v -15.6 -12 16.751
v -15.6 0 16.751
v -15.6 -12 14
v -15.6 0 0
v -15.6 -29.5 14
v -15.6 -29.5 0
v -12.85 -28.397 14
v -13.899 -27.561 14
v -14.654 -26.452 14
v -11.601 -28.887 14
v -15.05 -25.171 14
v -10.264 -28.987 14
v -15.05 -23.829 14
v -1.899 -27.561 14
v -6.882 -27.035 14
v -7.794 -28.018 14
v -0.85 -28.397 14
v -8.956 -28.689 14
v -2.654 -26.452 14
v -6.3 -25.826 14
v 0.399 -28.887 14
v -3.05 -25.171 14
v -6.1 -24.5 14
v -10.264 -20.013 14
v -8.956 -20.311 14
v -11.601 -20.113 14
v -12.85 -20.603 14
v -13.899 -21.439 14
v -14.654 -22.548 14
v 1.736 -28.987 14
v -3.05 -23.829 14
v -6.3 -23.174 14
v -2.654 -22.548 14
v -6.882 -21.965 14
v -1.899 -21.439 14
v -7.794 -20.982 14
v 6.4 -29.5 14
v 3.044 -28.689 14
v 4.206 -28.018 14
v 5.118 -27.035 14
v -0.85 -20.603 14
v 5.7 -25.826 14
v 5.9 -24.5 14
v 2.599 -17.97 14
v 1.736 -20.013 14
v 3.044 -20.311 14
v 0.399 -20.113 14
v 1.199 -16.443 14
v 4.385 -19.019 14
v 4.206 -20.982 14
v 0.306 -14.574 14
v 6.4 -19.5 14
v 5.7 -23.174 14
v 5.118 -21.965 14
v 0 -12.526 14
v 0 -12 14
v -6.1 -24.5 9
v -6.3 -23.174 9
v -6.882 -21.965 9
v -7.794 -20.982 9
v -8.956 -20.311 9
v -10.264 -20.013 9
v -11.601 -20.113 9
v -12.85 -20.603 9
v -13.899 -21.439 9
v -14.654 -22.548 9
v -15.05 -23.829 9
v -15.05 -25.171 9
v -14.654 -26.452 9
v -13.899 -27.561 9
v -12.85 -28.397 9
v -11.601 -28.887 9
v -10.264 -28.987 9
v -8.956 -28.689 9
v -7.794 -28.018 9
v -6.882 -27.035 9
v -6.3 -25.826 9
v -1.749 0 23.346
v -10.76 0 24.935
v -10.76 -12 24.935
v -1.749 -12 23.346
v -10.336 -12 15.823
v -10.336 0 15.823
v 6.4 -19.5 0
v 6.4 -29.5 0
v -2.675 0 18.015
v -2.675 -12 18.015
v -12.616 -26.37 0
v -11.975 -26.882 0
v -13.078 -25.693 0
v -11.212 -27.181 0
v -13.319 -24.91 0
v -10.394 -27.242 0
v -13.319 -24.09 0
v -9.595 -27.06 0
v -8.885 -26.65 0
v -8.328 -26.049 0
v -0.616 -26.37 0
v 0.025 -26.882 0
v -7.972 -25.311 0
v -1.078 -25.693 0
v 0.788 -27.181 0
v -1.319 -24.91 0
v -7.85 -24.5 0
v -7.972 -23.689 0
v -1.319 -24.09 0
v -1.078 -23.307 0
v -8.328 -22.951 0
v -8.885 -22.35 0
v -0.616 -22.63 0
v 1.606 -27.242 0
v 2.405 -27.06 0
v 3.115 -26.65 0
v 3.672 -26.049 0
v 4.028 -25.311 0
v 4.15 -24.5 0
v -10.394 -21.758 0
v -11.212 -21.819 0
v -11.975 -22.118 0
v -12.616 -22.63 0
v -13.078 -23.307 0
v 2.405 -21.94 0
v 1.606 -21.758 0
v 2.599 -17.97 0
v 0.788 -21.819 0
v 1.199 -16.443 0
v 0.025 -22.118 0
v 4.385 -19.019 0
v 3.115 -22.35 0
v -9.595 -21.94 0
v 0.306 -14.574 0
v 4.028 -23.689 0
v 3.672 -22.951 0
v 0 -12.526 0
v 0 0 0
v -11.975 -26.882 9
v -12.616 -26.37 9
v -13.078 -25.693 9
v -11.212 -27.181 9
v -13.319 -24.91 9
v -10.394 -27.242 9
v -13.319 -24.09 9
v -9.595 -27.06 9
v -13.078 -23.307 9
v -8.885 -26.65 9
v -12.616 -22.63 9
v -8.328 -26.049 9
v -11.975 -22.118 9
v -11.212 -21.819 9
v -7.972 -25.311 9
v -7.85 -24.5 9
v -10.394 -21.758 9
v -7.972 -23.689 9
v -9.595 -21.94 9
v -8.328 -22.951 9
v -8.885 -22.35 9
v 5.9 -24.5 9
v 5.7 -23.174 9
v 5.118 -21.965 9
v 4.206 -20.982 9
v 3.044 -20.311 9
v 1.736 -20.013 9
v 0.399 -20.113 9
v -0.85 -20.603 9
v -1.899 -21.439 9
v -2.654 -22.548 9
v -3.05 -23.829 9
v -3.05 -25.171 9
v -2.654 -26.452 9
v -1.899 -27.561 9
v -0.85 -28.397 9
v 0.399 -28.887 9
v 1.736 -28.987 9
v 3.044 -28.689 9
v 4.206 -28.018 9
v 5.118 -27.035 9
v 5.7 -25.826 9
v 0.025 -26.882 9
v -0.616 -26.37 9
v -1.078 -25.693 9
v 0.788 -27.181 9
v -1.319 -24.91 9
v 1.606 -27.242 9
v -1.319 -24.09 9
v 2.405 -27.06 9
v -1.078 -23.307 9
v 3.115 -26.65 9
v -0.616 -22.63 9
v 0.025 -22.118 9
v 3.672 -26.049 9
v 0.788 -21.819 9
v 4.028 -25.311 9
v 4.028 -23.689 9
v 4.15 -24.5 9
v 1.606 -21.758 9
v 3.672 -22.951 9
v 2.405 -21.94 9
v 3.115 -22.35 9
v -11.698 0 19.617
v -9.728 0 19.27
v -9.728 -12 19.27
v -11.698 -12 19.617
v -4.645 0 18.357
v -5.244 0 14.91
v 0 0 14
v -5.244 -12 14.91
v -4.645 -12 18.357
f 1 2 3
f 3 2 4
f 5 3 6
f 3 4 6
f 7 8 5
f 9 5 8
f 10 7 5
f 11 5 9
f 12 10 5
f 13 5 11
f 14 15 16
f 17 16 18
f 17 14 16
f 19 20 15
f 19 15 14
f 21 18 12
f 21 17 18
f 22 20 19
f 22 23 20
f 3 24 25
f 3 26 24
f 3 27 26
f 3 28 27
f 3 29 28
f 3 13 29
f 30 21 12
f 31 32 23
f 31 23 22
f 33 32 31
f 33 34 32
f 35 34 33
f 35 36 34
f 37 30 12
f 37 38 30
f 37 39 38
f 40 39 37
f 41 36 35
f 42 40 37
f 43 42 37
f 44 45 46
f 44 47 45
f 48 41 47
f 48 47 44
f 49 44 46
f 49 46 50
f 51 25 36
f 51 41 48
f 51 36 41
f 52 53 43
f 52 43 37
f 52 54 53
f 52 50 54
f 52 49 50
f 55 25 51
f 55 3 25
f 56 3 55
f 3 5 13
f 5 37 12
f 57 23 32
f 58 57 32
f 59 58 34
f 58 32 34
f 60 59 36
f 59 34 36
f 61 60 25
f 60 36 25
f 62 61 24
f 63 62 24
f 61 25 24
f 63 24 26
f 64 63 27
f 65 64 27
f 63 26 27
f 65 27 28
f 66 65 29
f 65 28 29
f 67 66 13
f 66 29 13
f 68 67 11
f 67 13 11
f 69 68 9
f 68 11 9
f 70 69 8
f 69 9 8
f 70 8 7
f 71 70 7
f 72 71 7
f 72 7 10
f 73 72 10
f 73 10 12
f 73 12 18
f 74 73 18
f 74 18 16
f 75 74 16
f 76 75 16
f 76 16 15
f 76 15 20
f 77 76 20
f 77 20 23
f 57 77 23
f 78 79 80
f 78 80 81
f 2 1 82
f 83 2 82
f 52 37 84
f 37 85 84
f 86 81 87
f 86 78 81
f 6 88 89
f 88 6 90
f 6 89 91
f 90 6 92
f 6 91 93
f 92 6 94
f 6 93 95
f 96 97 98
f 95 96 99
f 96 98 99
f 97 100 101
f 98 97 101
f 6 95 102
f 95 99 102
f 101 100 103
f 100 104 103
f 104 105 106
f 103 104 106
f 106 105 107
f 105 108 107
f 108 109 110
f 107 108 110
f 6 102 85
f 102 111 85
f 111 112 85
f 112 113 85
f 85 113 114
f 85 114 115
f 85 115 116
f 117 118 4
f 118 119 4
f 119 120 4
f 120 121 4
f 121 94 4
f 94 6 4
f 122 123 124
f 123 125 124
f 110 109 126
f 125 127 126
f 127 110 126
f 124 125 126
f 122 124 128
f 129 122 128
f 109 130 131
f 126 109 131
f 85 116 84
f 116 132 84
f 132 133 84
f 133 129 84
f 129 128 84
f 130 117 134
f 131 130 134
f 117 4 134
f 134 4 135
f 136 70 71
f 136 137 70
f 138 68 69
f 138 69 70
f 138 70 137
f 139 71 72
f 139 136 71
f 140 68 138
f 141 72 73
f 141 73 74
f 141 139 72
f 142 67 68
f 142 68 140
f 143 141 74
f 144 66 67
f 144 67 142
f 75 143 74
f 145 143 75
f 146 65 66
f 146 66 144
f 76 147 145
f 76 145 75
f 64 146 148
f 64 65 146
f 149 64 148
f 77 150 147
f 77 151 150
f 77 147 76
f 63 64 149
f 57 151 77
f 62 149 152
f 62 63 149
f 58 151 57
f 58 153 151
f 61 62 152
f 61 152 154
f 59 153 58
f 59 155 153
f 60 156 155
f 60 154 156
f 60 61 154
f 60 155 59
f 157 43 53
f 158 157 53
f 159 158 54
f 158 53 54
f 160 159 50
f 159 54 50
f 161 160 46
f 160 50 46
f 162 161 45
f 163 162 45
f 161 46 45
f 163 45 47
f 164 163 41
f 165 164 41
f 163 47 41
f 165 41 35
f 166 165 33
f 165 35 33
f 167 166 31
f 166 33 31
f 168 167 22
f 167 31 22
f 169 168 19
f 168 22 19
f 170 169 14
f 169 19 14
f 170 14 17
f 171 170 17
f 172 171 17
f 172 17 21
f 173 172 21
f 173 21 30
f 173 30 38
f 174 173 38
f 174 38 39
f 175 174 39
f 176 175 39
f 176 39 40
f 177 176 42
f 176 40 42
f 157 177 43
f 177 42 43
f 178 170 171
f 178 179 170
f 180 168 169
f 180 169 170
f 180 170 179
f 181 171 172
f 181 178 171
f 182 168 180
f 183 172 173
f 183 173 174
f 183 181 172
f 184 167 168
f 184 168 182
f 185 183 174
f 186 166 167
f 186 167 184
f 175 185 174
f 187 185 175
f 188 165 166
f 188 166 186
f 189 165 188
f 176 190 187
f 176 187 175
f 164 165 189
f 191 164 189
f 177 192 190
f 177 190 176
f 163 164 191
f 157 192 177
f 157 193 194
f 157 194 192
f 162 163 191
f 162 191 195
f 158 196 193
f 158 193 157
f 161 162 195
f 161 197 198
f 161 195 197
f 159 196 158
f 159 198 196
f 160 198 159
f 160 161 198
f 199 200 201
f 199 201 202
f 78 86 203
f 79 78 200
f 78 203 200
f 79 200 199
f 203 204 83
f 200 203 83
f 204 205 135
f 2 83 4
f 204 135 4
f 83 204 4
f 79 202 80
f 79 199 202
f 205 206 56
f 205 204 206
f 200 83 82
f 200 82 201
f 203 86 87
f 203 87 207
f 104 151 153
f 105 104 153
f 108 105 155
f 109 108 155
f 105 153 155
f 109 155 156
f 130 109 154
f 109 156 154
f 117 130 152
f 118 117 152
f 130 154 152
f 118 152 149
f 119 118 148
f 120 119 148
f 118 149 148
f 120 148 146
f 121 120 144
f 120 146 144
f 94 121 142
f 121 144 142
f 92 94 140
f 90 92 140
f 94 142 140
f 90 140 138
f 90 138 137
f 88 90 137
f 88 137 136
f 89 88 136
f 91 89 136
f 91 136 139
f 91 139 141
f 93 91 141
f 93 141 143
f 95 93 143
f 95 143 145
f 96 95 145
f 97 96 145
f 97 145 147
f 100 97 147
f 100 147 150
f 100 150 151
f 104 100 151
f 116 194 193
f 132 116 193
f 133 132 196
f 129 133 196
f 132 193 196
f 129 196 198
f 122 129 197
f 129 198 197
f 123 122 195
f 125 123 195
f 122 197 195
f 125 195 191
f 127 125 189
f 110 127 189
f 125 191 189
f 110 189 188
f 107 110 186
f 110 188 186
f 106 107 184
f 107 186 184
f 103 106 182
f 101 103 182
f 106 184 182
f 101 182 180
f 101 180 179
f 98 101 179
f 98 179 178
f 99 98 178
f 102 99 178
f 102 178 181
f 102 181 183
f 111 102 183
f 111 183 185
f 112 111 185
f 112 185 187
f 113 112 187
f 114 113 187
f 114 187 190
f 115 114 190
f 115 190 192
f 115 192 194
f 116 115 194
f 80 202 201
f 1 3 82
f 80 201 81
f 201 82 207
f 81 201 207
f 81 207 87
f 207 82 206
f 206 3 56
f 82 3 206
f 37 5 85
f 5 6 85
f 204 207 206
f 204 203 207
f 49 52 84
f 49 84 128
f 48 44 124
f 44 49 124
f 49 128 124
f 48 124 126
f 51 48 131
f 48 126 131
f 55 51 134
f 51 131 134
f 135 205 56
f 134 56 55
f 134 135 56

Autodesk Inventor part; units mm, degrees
ref_plane "YZ Plane" through (0, 0, 0) normal (1, 0, 0) x (0, 1, 0)
ref_plane "XZ Plane" through (0, 0, 0) normal (0, 1, 0) x (-1, 0, 0)
ref_plane "XY Plane" through (0, 0, 0) normal (0, 0, 1) x (1, 0, 0)
sketch "Sketch5" plane through (0, 0, 0) normal (0, 0, 1) x (1, 0, 0)
  line L0 (0, 0) -> (-15.6, 0)
  line L1 (-15.6, 0) -> (-15.6, -29.5)
  line L2 (-15.6, -29.5) -> (6.4, -29.5)
  line L3 (6.4, -29.5) -> (6.4, -19.5)
  line L4 (0, 0) -> (0, -12.526)
  line L5 (0, -12.526) -> (0, -19.5)
  line L6 (0, -19.5) -> (6.4, -19.5)
  dimension "d111" = 15.6
  dimension "d112" = 29.5
  dimension "d113" = 22
  dimension "d114" = 10
  dimension "d116" = 12.526
extrude "Extrusion2" add sketch "Sketch5" along normal blind 14
sketch "Skizze14" plane through (0, 0, 14) normal (0, 0, 1) x (1, 0, 0)
  line L0 (-15.6, -29.5) -> (6.4, -29.5) projected
  line L1 (-15.6, 0) -> (-15.6, -29.5) projected
  circle A0 centre (-10.6, -24.5) radius 4.5
  circle A1 centre (1.4, -24.5) radius 4.5
  circle A2 centre (-10.6, -24.5) radius 2.75
  circle A3 centre (1.4, -24.5) radius 2.75
  point P0 (0, 0)
  dimension "d117" = 5
  dimension "d118" = 5
  dimension "d119" = 12
  dimension "d120" = 5
  dimension "d121" = 9
  dimension "d122" = 9
  dimension "d123" = 5.5
  dimension "d124" = 5.5
extrude "Extrusion9" cut sketch "Skizze14" against normal blind 5 contours A0 | A1 | A2 | A3
sketch "Skizze16" plane through (0, 0, 14) normal (0, 0, 1) x (1, 0, 0)
  circle A0 centre (-10.6, -24.5) radius 2.75
  circle A1 centre (1.4, -24.5) radius 2.75
  line L0 (-15.6, 0) -> (-15.6, -29.5) projected
  line L1 (-15.6, -29.5) -> (6.4, -29.5) projected
  line L2 (6.4, -29.5) -> (6.4, -19.5) projected
  point P0 (0, 0)
  dimension "d127" = 5
  dimension "d128" = 5
  dimension "d129" = 5
  dimension "d130" = 5
  dimension "d131" = 5.5
  dimension "d132" = 5.5
extrude "Extrusion10" cut sketch "Skizze16" against normal blind 15
fillet "Rundung3" radius 7 1 edges at (0, -19.5, 7)
sketch "Skizze17" plane through (-15.6, 0, 0) normal (0, 1, 0) x (1, 0, 0)
  line L0 (0, -14) -> (22, -14) projected
  line L1 (0, -14) -> (0, -16.751)
  line L2 (0, -16.751) -> (5.264, -15.8228)
  line L3 (5.8718, -19.2696) -> (3.9022, -19.6169)
  line L4 (3.9022, -19.6169) -> (4.8399, -24.9349)
  line L5 (4.8399, -24.9349) -> (13.8508, -23.346)
  line L6 (10.3562, -14.9105) -> (15.6, -14)
  line L7 (5.264, -15.8228) -> (5.8718, -19.2696)
  line L8 (13.8508, -23.346) -> (12.9251, -18.0147)
  line L9 (12.9251, -18.0147) -> (10.9546, -18.3569)
  line L10 (10.9546, -18.3569) -> (10.3562, -14.9105)
  point P0 (15.6, 0)
  dimension "d136" = 2.751
  dimension "d137" = 80
  dimension "d141" = 3.5
  dimension "d143" = 2
  dimension "d144" = 5.4
  dimension "d145" = 9.15
  dimension "d147" = 2
extrude "Extrusion11" add sketch "Skizze17" against normal blind 12
equation "\"l1\" = 8"
properties part number "Finray_9_Kerbe_10deg_anschluss_erweitert_9_75 Nut"
